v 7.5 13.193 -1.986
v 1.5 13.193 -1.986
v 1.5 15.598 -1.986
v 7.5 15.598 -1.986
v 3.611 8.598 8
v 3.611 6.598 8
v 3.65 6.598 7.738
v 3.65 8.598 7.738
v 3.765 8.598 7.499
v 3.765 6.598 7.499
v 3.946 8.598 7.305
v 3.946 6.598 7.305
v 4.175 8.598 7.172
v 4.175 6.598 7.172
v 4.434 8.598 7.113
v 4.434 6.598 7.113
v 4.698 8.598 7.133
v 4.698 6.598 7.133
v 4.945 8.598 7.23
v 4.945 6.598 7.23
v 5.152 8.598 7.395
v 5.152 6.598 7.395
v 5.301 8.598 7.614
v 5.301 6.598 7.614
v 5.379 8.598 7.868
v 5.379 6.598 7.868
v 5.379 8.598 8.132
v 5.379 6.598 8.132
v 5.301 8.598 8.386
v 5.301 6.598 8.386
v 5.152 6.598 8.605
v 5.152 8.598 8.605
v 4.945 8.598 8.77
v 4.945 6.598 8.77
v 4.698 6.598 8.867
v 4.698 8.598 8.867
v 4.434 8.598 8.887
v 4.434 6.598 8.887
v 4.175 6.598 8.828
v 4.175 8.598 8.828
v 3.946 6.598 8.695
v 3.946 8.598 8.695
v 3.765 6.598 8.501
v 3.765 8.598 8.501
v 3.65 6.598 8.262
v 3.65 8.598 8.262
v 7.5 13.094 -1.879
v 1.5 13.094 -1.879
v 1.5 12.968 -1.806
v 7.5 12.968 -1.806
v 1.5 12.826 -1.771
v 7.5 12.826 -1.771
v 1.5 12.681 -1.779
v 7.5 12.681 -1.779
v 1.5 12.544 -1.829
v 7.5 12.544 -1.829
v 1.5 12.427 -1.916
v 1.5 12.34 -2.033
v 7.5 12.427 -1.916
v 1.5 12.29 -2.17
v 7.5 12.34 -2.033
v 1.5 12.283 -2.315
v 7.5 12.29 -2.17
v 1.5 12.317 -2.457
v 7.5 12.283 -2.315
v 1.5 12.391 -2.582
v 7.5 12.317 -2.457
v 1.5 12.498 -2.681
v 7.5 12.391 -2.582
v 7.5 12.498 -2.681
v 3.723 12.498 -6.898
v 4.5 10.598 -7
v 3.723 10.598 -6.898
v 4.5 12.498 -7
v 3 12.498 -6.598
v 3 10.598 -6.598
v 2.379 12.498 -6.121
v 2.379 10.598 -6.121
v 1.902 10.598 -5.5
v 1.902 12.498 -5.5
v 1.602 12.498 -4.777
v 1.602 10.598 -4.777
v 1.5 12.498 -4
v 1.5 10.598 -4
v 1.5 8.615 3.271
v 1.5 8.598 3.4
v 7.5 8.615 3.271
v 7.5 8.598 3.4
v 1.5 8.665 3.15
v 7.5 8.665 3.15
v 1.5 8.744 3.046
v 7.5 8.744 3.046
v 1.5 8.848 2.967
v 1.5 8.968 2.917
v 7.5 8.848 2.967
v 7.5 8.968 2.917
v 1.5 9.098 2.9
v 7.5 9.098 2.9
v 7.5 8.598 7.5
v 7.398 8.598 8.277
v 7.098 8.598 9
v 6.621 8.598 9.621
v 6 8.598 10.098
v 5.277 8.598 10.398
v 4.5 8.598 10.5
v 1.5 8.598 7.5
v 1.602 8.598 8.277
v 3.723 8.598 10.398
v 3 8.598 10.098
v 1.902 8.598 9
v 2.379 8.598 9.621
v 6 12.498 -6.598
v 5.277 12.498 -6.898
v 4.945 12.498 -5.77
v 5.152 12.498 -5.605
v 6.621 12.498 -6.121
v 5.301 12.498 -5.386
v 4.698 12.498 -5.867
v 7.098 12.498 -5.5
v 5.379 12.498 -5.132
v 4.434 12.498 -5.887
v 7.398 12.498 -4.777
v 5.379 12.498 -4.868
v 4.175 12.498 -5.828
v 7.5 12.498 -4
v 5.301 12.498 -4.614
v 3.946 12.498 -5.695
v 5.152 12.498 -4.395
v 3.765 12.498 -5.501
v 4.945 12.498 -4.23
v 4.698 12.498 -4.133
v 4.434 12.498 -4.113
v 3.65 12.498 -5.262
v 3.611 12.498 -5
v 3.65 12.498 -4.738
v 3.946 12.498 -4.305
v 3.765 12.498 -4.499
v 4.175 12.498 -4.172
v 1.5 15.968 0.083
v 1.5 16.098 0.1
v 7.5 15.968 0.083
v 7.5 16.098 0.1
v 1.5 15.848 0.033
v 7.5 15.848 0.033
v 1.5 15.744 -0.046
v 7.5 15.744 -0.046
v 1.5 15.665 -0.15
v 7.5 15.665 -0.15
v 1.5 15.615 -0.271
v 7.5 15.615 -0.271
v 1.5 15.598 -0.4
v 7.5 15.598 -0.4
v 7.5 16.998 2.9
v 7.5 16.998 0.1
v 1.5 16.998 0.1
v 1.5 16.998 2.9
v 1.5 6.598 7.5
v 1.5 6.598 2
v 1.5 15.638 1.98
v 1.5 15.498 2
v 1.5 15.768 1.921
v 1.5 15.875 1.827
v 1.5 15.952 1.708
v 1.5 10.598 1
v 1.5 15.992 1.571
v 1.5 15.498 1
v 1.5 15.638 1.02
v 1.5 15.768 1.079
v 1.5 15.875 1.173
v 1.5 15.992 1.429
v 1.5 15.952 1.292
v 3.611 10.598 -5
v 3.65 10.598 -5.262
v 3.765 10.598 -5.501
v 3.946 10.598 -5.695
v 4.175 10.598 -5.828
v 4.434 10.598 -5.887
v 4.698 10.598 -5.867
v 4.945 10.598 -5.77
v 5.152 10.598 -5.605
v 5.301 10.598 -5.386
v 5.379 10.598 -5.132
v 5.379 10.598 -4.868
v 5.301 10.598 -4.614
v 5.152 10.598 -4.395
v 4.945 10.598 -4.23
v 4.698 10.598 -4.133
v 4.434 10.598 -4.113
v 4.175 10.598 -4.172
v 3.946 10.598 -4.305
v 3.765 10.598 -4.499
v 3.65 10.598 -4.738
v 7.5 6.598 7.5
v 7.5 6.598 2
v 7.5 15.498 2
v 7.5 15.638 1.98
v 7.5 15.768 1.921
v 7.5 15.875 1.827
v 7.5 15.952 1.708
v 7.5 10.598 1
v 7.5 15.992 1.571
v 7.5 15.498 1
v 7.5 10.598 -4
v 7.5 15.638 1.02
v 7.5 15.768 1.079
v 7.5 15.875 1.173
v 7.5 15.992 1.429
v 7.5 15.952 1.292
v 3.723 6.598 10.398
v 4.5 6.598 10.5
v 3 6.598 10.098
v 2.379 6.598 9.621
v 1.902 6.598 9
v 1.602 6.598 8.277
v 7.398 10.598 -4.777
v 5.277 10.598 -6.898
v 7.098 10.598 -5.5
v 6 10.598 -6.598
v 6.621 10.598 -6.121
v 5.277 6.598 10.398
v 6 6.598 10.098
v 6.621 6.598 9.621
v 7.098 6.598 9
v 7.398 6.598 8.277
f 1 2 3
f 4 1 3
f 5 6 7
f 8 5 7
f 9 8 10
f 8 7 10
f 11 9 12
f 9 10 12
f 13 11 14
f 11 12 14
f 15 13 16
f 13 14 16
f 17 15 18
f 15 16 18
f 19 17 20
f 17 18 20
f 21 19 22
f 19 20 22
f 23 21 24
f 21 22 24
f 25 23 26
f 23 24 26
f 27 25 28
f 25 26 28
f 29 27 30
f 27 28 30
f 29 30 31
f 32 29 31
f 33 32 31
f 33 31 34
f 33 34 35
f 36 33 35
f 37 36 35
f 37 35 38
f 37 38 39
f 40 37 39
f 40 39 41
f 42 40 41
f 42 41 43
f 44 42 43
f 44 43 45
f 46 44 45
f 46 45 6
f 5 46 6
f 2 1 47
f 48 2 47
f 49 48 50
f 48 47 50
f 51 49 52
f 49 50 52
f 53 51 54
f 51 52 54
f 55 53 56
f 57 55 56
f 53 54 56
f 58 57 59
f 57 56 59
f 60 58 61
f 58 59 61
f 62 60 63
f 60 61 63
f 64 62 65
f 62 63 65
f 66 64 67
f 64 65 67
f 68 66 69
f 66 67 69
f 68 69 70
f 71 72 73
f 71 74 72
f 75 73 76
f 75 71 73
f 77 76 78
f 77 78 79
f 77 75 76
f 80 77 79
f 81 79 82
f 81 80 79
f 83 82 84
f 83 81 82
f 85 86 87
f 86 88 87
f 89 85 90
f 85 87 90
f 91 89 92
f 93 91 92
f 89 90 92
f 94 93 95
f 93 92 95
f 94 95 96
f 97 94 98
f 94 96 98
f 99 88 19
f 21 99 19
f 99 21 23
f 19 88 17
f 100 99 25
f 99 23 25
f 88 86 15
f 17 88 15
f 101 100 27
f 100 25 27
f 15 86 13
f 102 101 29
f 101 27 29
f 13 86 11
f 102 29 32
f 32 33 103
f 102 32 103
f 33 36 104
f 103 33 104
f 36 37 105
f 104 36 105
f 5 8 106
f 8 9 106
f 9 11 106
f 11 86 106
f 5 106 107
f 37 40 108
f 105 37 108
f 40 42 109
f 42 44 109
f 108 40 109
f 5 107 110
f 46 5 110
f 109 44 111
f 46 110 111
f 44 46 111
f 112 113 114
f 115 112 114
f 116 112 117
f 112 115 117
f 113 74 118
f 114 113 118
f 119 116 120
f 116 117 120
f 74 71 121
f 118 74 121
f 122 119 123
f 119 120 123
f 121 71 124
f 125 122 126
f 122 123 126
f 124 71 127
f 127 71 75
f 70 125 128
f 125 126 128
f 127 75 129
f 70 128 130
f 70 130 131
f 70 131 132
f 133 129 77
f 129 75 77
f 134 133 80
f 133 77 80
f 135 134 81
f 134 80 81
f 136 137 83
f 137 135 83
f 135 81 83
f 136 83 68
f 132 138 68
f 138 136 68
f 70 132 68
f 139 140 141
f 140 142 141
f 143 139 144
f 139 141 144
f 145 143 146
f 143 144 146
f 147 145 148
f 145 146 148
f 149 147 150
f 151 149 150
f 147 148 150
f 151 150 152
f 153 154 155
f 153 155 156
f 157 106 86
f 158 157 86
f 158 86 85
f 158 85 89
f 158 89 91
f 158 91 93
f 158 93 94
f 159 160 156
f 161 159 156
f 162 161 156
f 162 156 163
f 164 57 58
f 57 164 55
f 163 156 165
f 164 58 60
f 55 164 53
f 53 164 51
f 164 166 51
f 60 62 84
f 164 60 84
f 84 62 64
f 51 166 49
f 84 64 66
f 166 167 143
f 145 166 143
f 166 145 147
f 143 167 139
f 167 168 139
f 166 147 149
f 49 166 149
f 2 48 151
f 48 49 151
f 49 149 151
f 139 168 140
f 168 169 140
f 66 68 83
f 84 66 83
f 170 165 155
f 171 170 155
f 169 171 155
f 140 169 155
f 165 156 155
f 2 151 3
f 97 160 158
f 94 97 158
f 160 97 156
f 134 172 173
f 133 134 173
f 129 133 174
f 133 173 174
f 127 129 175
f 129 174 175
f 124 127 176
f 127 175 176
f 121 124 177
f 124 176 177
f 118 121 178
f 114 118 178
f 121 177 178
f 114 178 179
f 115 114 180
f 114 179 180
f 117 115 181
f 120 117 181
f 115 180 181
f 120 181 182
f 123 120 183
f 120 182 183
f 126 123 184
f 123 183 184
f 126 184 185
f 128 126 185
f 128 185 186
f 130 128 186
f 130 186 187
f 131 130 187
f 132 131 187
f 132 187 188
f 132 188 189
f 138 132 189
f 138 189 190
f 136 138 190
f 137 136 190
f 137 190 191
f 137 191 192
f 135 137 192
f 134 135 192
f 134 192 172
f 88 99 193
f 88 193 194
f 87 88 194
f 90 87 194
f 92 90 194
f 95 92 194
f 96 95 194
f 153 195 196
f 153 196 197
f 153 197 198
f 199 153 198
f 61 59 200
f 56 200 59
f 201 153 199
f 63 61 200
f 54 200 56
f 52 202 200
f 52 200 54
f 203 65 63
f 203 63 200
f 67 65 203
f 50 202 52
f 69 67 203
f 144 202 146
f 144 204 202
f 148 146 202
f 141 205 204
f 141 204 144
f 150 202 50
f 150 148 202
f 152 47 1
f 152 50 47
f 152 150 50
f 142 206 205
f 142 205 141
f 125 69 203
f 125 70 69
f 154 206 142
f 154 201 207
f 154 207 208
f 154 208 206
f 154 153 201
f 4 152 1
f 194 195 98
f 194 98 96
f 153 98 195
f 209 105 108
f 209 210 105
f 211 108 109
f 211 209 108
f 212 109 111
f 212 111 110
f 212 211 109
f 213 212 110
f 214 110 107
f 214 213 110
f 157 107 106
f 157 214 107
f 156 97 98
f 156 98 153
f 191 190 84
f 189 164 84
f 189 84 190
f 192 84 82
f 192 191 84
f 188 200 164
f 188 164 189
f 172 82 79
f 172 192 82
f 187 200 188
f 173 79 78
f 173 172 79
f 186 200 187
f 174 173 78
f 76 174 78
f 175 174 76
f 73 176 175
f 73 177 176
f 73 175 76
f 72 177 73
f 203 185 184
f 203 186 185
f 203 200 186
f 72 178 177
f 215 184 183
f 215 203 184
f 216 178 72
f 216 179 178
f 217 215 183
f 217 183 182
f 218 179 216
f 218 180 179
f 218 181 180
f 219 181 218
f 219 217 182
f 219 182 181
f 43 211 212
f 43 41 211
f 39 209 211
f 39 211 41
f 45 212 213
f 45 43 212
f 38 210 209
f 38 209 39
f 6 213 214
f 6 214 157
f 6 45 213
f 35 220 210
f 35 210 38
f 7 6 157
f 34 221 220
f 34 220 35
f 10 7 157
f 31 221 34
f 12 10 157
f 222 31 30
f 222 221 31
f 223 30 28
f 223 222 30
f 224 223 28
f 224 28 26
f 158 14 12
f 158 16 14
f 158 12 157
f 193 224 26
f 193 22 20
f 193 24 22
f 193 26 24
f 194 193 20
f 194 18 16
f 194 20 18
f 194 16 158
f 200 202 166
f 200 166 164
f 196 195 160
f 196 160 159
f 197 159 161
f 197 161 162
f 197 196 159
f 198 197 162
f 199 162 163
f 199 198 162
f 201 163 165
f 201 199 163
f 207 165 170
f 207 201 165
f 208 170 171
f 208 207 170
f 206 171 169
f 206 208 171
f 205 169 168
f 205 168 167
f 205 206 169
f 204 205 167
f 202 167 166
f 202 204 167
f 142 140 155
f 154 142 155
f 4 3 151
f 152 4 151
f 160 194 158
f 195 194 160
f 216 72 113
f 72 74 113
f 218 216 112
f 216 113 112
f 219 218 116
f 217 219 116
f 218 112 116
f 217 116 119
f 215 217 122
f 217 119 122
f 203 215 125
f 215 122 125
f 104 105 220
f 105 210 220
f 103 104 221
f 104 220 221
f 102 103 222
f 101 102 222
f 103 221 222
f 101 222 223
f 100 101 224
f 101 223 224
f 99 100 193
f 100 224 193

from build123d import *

# Parameters (mm, degrees)
BOSS_EXTRUDE1_DEPTH   = 6
SKETCH3_W             = 7.6
SKETCH3_H             = 8.4
SKETCH3_H_2           = 4.9
CUT_EXTRUDE2_DEPTH    = 21.860671783
SKETCH4_W             = 7.6
SKETCH4_H             = 3.5
SKETCH4_W_2           = 5.5
SKETCH4_H_2           = 3.1
CUT_EXTRUDE3_DEPTH    = 21.860671783
FILLET2_R             = 3
F_2_56_TAPPED_HOLE1_D = 1.778
FILLET3_R             = 0.5
F_2_56_TAPPED_HOLE2_D = 1.778
SKETCH19_R            = 0.5
CUT_EXTRUDE6_DEPTH    = 21.860671783


with BuildPart() as part:
    # Sketch1 → Boss-Extrude1 (new body)
    with BuildSketch(Plane(origin=(7.5, 0, 0), x_dir=(0, 0, -1), z_dir=(1, 0, 0))):
        with BuildLine():
            Line((-10.5, 16.997577099), (-10.5, 6.597577099))
            Line((-10.5, 6.597577099), (-2, 6.597577099))
            Line((-2, 6.597577099), (-2, 15.497577099))
            ThreePointArc((-2, 15.497577099), (-1.5, 15.997577099), (-1, 15.497577099))
            Line((-1, 15.497577099), (-1, 10.597577099))
            Line((-1, 10.597577099), (7, 10.597577099))
            Line((7, 10.597577099), (7, 16.997577099))
            Line((7, 16.997577099), (-10.5, 16.997577099))
        make_face()
    extrude(amount=-BOSS_EXTRUDE1_DEPTH)

    # Sketch3 → Cut-Extrude2 (cut, through all)
    with BuildSketch(Plane.ZY.offset(-1.5)):
        with Locations((6.7, 16.297577099)):
            Rectangle(SKETCH3_W, SKETCH3_H)
        with Locations((-3.7, 18.047577099)):
            Rectangle(SKETCH3_W, SKETCH3_H_2)
    extrude(amount=-CUT_EXTRUDE2_DEPTH, mode=Mode.SUBTRACT)

    # Sketch4 → Cut-Extrude3 (cut, through all)
    with BuildSketch(Plane.ZY.offset(-1.5)):
        with Locations((6.7, 10.347577099)):
            Rectangle(SKETCH4_W, SKETCH4_H)
        with Locations((-4.736302331, 14.047577099)):
            Rectangle(SKETCH4_W_2, SKETCH4_H_2)
    extrude(amount=-CUT_EXTRUDE3_DEPTH, mode=Mode.SUBTRACT)

    # Fillet2
    fillet2_edges = [part.edges().sort_by_distance(p)[0] for p in [
        (1.5, 7.597577099, 10.5),
        (7.5, 7.597577099, 10.5),
        (7.5, 11.547577099, -7),
        (1.5, 11.547577099, -7),
    ]]
    fillet(fillet2_edges, radius=FILLET2_R - 0.0001)  # a hair under: the kernel refuses the full size

    # #2-56 Tapped Hole1 (through all)
    with Locations(Plane(origin=(0, 8.597577099, 0), x_dir=(1, 0, 0), z_dir=(0, 1, 0))):
        with Locations((4.5, -8)):
            Hole(F_2_56_TAPPED_HOLE1_D / 2)

    # Fillet3
    fillet3_edges = [part.edges().sort_by_distance(p)[0] for p in [
        (4.5, 15.597577099, 0.1),
        (4.5, 8.597577099, 2.9),
    ]]
    fillet(fillet3_edges, radius=FILLET3_R)

    # #2-56 Tapped Hole2 (through all)
    with Locations(Plane(origin=(0, 12.497577099, 0), x_dir=(1, 0, 0), z_dir=(0, 1, 0))):
        with Locations((4.5, 5)):
            Hole(F_2_56_TAPPED_HOLE2_D / 2)

    # Sketch19 → Cut-Extrude6 (cut, through all)
    with BuildSketch(Plane(origin=(7.5, 0, 0), x_dir=(0, 0, -1), z_dir=(1, 0, 0))):
        with Locations((2.269145043, 12.780419811)):
            Circle(SKETCH19_R)
    extrude(amount=-CUT_EXTRUDE6_DEPTH, mode=Mode.SUBTRACT)


solid = part.part
